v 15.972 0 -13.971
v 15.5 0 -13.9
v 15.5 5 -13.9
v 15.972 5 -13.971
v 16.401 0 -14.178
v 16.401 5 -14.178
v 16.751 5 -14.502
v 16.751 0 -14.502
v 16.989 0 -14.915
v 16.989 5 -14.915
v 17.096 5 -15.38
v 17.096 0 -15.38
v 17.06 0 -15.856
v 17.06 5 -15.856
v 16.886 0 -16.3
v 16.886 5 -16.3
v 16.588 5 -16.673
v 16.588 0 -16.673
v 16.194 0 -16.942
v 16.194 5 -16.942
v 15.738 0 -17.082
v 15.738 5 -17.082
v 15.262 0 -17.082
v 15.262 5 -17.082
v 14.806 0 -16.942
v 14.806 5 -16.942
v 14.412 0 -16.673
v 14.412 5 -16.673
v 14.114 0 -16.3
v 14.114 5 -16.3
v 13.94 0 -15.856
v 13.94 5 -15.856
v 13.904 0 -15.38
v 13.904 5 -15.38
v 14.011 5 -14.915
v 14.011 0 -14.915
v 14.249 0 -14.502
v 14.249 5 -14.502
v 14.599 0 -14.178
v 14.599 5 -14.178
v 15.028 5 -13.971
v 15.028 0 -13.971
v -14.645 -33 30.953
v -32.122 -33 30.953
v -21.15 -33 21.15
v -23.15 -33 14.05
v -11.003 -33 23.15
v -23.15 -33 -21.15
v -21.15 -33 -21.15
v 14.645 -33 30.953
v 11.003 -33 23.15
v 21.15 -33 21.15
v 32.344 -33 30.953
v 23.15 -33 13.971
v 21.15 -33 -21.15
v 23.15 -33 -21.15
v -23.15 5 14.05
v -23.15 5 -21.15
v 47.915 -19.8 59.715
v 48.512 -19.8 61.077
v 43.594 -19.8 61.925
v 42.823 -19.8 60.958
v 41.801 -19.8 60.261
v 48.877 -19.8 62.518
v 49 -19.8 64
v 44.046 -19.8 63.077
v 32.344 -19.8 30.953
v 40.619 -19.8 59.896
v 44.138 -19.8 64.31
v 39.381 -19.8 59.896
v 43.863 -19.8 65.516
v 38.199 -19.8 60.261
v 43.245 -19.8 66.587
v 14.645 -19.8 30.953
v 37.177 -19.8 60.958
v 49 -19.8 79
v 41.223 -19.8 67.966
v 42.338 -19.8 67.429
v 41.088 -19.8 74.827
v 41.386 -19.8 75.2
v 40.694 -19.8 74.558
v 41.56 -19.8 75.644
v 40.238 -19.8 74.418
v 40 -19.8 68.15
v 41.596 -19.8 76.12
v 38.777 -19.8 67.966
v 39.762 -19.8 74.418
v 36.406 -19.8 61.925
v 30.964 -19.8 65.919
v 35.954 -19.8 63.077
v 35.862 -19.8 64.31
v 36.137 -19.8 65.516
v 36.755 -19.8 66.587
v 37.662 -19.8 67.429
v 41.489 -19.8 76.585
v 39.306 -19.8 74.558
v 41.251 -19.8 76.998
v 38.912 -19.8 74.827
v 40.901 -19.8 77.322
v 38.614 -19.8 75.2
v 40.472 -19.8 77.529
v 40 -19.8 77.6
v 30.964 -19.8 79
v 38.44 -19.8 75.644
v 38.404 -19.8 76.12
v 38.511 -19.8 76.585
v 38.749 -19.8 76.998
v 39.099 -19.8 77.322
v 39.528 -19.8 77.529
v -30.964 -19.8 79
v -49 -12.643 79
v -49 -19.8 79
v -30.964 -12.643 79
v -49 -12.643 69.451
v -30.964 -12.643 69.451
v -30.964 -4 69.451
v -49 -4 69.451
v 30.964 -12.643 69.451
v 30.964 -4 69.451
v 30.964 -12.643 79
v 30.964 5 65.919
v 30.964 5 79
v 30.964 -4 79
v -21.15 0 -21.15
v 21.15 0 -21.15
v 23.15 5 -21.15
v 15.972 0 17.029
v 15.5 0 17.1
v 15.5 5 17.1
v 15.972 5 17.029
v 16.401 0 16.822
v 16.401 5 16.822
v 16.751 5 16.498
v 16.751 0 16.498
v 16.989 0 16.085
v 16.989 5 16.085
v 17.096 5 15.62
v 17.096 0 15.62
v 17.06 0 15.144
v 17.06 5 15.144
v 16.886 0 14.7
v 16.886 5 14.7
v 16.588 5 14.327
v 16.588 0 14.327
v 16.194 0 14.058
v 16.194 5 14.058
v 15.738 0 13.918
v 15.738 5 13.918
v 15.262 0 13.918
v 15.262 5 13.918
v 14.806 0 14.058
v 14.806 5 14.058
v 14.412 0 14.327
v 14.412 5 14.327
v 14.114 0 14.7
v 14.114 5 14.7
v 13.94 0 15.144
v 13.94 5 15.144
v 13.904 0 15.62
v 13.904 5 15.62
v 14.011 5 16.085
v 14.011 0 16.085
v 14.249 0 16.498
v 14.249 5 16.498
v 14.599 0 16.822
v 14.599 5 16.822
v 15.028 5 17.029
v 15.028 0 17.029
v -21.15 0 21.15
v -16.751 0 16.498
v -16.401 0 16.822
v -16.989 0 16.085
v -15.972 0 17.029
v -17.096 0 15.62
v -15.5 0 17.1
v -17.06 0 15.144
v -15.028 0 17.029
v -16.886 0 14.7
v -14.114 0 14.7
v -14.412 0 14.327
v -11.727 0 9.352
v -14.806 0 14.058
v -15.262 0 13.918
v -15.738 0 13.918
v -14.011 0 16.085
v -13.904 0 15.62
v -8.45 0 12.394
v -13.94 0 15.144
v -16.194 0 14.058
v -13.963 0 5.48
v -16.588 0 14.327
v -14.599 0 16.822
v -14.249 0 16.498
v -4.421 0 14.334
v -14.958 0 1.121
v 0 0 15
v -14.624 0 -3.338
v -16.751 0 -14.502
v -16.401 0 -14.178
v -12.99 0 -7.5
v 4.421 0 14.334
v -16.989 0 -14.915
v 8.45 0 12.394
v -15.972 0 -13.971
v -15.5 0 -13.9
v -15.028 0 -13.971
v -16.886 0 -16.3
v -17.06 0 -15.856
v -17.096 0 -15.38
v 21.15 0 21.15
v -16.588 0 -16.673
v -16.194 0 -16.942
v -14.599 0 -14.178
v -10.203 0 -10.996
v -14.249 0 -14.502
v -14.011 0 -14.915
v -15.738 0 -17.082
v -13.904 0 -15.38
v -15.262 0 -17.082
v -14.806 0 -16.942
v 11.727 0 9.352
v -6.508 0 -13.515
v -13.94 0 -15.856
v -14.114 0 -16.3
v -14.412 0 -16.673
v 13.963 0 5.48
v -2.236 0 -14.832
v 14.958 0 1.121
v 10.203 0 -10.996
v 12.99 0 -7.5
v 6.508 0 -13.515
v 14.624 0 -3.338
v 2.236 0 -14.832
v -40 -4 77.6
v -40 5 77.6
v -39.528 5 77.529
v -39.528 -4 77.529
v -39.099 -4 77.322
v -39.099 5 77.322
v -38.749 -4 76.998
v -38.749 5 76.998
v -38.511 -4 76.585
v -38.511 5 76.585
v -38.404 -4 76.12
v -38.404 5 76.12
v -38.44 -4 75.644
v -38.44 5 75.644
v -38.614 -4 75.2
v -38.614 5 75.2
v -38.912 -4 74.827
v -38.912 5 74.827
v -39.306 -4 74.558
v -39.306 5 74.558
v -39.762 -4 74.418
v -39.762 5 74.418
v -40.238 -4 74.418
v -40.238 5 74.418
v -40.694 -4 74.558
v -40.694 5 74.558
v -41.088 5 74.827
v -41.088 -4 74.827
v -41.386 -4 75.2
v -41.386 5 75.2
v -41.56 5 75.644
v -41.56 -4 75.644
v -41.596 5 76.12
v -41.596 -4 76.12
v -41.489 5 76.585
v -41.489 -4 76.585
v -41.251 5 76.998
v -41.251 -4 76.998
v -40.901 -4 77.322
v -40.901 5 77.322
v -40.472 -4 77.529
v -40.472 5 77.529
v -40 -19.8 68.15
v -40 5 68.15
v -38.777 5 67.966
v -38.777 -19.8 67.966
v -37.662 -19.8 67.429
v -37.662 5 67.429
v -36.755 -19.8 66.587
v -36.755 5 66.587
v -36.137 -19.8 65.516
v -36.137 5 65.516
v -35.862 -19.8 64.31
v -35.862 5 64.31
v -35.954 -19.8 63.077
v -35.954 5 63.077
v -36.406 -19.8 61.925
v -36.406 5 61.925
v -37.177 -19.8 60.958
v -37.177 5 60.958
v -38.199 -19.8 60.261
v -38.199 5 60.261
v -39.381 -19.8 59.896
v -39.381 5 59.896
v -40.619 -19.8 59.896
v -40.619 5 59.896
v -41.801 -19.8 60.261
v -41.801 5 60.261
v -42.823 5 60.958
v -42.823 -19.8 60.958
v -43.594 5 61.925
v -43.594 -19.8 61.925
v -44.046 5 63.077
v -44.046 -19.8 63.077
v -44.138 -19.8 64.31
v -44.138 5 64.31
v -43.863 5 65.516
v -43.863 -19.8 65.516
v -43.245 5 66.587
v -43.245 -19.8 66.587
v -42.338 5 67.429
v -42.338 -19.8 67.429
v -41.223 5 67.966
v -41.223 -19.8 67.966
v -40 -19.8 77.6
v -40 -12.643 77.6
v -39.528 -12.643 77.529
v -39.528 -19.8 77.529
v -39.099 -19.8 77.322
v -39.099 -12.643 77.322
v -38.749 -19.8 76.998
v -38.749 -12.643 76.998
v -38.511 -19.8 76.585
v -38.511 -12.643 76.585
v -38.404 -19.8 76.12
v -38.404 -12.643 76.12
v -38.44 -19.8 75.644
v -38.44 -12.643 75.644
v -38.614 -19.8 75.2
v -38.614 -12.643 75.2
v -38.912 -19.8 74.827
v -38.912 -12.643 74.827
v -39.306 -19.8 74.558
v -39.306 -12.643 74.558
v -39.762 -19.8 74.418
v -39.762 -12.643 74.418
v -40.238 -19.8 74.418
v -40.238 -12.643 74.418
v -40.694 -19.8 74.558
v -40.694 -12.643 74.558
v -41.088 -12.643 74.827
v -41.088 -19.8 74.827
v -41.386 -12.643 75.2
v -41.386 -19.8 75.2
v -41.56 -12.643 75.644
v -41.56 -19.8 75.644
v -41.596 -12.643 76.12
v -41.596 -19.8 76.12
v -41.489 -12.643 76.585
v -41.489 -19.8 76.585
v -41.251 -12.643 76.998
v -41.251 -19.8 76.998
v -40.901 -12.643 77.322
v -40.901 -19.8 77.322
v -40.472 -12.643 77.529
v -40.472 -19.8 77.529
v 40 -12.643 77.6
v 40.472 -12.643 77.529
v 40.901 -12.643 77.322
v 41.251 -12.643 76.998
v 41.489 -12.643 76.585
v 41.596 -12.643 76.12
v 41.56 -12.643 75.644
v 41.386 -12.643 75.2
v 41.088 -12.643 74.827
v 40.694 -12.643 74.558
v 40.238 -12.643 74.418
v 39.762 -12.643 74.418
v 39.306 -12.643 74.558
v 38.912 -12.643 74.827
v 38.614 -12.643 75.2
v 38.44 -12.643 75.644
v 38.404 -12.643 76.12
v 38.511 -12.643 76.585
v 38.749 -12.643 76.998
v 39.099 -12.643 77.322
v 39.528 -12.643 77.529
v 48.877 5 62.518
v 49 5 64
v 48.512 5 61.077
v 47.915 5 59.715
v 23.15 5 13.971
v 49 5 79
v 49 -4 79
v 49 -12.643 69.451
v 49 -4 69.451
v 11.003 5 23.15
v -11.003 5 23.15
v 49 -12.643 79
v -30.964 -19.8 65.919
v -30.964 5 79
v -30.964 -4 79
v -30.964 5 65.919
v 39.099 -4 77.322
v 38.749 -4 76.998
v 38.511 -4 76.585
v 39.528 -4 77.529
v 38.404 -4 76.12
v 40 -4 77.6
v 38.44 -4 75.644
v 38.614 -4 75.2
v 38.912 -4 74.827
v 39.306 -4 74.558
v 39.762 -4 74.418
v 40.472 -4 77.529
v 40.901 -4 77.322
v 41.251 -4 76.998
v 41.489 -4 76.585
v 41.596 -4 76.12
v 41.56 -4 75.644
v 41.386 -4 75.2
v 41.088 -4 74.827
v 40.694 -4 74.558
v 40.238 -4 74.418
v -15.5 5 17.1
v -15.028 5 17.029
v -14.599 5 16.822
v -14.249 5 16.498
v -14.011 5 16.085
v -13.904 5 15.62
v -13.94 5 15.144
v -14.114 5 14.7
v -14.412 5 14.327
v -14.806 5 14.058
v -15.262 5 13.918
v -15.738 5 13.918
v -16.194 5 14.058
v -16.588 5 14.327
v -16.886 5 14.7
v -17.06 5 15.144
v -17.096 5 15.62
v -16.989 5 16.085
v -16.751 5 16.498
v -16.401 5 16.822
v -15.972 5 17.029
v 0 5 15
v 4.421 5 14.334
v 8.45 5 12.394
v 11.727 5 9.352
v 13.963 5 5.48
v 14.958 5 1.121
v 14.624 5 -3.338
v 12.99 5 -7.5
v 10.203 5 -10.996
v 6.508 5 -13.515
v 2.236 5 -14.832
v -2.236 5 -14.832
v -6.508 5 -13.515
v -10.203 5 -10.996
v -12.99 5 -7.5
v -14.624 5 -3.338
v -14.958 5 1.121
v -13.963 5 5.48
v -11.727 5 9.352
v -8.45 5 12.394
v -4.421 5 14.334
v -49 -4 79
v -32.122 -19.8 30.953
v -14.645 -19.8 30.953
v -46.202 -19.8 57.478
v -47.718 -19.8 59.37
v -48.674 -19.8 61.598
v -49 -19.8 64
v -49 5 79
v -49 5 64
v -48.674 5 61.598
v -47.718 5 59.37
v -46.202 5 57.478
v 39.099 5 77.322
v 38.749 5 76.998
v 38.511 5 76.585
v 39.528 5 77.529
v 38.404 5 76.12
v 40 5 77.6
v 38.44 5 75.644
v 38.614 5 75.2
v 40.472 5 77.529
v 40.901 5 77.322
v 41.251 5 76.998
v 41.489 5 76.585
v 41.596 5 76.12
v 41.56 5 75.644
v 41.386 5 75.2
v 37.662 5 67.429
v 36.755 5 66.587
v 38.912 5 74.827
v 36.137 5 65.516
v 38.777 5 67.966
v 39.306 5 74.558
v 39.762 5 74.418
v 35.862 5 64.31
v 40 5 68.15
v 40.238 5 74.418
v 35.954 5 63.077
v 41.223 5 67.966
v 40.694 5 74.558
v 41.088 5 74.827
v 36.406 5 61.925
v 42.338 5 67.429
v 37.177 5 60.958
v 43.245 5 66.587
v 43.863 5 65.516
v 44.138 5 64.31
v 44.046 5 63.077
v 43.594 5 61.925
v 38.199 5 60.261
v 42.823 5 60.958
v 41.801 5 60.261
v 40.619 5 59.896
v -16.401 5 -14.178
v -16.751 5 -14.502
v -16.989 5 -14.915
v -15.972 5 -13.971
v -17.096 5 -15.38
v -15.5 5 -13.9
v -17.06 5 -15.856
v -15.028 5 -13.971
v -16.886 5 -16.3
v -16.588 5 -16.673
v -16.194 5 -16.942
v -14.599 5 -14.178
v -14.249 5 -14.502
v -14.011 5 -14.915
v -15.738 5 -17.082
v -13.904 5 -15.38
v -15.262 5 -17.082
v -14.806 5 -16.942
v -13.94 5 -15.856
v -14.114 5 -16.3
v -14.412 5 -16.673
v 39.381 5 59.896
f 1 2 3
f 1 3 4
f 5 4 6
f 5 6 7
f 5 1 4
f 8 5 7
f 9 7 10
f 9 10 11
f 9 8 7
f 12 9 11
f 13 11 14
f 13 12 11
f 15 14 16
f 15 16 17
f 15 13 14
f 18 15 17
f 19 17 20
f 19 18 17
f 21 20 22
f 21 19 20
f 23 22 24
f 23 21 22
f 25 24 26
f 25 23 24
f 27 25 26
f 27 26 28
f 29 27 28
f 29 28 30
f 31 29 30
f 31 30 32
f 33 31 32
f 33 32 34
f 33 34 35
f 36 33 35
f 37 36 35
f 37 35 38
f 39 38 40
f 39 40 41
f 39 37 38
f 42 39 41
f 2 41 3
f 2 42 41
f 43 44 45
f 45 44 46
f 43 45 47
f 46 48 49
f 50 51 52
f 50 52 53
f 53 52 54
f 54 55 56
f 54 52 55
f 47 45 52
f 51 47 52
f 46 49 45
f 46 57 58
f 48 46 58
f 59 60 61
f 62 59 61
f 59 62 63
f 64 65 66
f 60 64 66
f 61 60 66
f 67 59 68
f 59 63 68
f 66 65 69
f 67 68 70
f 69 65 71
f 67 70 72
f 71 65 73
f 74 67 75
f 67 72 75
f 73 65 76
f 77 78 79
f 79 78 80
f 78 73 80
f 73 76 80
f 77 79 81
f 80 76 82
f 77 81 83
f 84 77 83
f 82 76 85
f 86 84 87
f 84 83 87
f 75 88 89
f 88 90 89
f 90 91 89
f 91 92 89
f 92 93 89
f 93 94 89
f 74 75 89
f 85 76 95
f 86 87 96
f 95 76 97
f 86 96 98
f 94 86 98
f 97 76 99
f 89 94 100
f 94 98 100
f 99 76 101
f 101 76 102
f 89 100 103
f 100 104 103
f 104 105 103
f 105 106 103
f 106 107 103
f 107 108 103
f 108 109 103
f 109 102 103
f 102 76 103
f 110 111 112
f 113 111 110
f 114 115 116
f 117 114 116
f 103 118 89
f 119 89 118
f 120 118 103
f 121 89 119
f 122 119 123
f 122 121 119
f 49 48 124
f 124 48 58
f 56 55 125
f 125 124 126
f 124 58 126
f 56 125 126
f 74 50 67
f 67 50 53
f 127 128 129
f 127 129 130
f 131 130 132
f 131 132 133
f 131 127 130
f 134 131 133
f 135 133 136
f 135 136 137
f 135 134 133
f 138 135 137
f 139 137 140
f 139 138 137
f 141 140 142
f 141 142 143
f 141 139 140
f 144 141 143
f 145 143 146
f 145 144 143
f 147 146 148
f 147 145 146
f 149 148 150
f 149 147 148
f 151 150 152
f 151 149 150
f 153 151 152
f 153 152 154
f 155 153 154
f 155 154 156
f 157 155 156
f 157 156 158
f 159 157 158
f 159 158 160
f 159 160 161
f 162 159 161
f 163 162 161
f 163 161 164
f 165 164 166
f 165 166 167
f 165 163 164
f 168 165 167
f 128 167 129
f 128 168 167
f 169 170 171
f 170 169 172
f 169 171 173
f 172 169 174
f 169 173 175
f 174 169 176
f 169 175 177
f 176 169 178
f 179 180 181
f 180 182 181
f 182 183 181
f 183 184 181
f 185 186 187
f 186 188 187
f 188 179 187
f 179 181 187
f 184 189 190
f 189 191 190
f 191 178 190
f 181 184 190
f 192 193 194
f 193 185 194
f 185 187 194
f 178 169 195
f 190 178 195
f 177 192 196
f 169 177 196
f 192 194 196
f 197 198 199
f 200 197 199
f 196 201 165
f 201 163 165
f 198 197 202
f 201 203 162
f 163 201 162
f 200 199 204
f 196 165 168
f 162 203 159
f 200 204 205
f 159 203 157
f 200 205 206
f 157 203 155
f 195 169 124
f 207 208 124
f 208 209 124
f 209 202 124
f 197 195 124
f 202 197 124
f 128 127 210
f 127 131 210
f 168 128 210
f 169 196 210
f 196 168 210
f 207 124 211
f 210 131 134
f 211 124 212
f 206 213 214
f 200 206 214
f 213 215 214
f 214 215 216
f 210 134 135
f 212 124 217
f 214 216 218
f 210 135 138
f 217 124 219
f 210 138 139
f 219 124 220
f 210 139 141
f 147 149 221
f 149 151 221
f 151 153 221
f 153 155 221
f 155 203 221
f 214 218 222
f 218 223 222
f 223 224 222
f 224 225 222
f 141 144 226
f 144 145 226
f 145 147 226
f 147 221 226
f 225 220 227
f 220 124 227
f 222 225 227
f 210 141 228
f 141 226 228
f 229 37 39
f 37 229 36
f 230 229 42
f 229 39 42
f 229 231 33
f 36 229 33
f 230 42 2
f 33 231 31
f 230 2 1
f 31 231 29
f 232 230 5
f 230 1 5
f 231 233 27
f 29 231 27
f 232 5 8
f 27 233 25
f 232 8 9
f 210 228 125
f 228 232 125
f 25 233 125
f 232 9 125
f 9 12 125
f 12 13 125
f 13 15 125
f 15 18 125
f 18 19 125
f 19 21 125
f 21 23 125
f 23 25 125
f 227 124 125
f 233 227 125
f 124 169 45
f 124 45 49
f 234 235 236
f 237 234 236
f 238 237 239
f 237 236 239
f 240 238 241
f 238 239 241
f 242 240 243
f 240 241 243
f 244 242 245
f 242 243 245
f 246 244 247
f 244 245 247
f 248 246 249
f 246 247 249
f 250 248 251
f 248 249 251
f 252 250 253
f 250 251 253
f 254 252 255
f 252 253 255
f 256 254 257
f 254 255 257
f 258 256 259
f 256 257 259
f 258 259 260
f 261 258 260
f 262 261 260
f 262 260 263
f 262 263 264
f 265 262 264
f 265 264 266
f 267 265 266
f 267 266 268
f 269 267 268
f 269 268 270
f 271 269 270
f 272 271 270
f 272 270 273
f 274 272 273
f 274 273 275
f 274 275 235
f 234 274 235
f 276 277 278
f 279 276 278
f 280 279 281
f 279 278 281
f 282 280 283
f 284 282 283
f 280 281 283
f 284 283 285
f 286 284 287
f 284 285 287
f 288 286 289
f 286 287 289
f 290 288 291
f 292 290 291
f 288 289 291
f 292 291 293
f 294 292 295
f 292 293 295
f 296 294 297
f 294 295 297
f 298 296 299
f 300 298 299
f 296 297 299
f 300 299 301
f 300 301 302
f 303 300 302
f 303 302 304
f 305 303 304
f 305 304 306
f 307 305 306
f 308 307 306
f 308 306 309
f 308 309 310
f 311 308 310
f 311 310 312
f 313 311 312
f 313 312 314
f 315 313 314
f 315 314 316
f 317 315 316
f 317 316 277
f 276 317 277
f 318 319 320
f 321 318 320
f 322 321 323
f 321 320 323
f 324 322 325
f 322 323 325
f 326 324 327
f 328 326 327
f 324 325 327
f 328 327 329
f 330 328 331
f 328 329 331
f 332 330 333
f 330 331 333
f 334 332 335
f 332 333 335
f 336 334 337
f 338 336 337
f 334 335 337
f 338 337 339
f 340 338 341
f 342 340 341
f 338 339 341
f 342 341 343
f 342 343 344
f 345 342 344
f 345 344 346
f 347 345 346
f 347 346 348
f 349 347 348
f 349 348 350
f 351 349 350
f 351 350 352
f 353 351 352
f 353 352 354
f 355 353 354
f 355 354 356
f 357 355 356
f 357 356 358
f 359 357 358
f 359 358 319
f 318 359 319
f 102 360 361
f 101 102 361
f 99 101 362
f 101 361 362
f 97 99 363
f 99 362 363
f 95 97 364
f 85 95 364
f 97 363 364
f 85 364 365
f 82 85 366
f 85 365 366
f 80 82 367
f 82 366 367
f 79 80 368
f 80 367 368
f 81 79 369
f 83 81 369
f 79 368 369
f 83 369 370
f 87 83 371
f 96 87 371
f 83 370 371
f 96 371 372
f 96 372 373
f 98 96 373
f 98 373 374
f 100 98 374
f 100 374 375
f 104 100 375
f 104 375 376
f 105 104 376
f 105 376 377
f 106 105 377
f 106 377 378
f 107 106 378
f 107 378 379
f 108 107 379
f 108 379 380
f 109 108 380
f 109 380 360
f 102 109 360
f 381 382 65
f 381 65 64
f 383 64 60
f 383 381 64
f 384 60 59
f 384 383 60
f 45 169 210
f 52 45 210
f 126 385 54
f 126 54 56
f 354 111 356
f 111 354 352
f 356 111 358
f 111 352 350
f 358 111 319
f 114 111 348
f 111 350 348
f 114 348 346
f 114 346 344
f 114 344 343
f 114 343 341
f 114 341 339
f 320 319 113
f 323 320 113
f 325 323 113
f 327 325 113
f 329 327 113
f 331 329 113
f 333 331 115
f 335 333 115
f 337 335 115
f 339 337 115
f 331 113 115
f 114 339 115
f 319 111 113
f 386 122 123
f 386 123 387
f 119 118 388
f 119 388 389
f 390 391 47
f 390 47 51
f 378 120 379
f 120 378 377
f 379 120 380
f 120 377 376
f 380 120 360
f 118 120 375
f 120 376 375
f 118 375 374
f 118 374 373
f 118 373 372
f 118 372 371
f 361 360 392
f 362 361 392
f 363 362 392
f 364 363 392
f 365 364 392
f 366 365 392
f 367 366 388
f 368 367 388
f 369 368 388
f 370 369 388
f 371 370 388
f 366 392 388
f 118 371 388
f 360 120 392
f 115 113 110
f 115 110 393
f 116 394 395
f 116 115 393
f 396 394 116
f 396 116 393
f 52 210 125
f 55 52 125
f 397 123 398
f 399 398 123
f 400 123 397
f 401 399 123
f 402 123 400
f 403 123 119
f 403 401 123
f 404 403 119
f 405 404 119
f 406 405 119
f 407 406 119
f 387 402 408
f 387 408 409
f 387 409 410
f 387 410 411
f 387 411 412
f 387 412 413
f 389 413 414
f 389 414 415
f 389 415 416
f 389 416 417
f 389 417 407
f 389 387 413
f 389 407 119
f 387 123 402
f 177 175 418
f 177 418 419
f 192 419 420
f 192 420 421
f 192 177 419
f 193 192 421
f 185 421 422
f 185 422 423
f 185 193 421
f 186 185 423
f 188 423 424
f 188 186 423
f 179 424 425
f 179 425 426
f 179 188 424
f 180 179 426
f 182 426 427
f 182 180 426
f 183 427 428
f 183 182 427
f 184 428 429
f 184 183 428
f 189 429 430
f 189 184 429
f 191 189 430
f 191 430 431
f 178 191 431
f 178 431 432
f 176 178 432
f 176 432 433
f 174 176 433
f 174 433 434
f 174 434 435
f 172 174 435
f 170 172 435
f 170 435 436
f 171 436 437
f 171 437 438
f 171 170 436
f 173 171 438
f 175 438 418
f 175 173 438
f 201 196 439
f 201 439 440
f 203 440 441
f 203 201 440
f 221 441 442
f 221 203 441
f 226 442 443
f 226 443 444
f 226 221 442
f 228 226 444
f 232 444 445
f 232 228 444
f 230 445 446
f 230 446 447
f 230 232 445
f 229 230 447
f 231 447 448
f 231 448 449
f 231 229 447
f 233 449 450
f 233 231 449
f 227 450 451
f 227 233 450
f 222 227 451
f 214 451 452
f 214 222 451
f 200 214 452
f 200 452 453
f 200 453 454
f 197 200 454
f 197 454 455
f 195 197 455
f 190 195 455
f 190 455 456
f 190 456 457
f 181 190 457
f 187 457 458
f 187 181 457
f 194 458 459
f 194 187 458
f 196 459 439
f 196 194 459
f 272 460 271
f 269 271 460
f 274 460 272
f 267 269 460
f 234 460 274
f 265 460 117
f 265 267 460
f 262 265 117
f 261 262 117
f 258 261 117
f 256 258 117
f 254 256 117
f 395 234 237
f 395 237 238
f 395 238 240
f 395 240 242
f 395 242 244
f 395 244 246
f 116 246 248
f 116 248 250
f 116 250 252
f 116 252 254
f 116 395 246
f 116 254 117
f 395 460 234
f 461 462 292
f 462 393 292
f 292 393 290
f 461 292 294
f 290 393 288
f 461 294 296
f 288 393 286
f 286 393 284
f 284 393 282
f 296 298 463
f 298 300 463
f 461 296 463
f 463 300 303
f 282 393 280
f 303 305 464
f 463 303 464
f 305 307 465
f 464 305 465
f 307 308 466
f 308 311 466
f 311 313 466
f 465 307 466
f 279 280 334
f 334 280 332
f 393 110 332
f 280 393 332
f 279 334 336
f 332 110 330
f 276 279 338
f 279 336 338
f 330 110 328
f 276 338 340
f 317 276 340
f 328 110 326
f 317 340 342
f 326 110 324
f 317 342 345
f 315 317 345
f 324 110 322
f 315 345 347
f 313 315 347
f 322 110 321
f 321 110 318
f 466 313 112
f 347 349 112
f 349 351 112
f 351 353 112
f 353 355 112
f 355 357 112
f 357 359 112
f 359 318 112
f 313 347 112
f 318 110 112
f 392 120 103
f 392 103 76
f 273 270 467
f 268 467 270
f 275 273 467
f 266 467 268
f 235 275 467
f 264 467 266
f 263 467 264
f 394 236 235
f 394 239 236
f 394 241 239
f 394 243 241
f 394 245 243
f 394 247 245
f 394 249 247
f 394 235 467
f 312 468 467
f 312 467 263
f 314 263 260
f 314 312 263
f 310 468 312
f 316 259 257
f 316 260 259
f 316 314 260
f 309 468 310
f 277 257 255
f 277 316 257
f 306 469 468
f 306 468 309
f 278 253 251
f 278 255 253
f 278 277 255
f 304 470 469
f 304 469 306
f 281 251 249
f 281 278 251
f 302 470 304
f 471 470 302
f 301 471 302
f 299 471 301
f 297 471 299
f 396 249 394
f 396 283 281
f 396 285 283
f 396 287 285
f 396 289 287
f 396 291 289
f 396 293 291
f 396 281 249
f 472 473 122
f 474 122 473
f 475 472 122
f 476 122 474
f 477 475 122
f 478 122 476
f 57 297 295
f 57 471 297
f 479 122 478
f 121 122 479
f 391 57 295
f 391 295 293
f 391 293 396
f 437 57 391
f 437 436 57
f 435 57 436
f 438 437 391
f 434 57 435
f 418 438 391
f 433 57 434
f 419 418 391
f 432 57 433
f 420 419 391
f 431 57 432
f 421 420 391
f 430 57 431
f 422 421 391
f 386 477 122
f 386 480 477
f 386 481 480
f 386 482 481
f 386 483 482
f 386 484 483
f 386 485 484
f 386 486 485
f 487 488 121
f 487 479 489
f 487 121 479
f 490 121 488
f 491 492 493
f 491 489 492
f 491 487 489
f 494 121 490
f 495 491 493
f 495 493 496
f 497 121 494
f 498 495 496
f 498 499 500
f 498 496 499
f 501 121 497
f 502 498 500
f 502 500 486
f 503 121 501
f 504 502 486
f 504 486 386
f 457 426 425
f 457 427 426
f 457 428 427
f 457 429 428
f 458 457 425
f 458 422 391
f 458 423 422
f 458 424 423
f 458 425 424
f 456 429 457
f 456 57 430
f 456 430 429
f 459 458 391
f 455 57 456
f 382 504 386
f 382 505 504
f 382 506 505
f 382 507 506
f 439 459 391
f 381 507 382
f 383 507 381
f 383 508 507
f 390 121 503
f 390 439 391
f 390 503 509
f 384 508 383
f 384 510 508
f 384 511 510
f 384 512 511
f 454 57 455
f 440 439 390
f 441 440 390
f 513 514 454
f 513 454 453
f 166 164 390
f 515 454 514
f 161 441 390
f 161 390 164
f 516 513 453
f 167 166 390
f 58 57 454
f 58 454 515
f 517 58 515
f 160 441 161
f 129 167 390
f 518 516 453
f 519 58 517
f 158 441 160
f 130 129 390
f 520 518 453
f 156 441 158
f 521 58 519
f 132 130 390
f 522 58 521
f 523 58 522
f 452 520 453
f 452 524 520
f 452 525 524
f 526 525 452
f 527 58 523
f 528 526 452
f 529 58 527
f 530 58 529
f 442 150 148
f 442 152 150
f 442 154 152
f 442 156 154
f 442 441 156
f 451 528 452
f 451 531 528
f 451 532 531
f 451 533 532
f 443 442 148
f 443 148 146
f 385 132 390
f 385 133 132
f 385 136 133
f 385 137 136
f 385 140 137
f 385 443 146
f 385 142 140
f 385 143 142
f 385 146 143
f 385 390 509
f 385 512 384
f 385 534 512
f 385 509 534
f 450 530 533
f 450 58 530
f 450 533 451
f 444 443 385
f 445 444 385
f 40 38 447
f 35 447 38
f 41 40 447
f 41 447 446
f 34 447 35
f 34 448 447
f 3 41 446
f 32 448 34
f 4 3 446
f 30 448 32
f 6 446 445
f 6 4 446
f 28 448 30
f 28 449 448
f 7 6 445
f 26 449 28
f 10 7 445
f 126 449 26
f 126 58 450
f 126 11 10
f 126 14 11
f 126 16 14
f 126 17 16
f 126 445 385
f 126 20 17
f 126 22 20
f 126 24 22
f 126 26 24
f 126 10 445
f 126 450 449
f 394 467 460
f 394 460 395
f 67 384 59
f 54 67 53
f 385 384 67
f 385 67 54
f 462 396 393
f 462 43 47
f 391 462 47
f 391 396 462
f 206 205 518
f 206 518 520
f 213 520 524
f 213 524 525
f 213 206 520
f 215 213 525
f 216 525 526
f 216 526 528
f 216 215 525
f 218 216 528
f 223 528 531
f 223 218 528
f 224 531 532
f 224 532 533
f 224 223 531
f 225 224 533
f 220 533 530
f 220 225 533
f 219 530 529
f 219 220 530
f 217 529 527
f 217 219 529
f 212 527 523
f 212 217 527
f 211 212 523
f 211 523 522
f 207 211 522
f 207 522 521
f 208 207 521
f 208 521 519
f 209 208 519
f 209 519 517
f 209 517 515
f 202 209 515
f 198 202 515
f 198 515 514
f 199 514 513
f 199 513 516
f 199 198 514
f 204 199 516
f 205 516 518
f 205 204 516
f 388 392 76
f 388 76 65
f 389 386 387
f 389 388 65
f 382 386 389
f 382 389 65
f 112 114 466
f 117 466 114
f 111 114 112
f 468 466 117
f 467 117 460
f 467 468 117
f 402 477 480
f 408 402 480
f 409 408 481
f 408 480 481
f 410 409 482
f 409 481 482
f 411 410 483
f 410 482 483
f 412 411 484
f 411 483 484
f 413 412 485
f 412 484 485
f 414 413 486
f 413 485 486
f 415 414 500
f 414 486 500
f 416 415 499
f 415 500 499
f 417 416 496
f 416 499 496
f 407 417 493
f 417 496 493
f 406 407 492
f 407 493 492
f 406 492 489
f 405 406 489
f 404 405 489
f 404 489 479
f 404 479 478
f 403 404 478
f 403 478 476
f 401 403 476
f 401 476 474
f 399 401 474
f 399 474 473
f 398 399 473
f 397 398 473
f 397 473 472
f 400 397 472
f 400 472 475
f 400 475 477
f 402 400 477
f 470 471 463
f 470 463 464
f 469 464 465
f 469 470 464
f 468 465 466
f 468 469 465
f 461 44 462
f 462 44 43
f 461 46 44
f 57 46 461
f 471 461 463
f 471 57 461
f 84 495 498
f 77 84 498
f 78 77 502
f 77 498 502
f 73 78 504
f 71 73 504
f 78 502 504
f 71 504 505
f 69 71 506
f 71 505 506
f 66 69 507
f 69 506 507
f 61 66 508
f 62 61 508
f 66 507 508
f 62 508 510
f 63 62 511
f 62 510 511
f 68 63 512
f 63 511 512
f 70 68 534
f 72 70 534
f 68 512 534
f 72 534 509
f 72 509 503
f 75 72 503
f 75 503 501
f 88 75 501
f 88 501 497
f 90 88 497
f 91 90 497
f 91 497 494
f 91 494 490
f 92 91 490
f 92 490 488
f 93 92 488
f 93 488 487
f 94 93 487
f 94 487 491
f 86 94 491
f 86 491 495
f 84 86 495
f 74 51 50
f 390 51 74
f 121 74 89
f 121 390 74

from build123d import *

# Parameters (mm, degrees)
SKETCH_6_W          = 42.3
SKETCH_6_H          = 42.3
SKETCH_6_R          = 1.6
SKETCH_6_R_2        = 15
EXTRUDE_1_DEPTH     = 5
SKETCH_7_R          = 1.6
SKETCH_7_R_2        = 4.15
EXTRUDE_5_DEPTH     = 38
SKETCH_7_7_R        = 4.15
SKETCH_7_7_R_2      = 1.6
EXTRUDE_7_DEPTH     = 38
SKETCH_7_8_R        = 4.15
SKETCH_7_8_R_2      = 1.6
EXTRUDE_8_DEPTH     = 38
SKETCH_12_W         = 2
SKETCH_12_H         = 44.3
EXTRUDE_11_DEPTH    = 38
SKETCH_14_W         = 44.3
SKETCH_14_H         = 2
EXTRUDE_12_DEPTH    = 38
SKETCH_15_W         = 2
SKETCH_15_H         = 42.3
EXTRUDE_13_DEPTH    = 38
CUT_EXTRUDE_1_DEPTH = 13.2
SKETCH_18_W         = 9.549489015
SKETCH_18_H         = 8.643215043
CUT_EXTRUDE_2_DEPTH = 123


with BuildPart() as part:
    # 草图6 → 凸台-拉伸1 (new body)
    with BuildSketch(Plane(origin=(0, 0, 0), x_dir=(1, 0, 0), z_dir=(0, 1, 0))):
        Rectangle(SKETCH_6_W, SKETCH_6_H)
        with Locations(Location((15.5, 15.5, 0), (0, 0, 270))):
            Circle(SKETCH_6_R, mode=Mode.SUBTRACT)
        with Locations(Location((-15.5, 15.5, 0), (0, 0, 270))):
            Circle(SKETCH_6_R, mode=Mode.SUBTRACT)
        with Locations(Location((-15.5, -15.5, 0), (0, 0, 270))):
            Circle(SKETCH_6_R, mode=Mode.SUBTRACT)
        with Locations(Location((15.5, -15.5, 0), (0, 0, 270))):
            Circle(SKETCH_6_R, mode=Mode.SUBTRACT)
        with Locations(Location((0, 0, 0), (0, 0, 270))):
            Circle(SKETCH_6_R_2, mode=Mode.SUBTRACT)
    extrude(amount=EXTRUDE_1_DEPTH)

    # 草图7 → 凸台-拉伸5 (add)
    with BuildSketch(Plane(origin=(0, 5, 0), x_dir=(1, 0, 0), z_dir=(0, 1, 0))):
        with BuildLine():
            Line((49, -79), (49, -64))
            ThreePointArc((49, -64), (48.724429591, -61.789948347), (47.914593709, -59.715235547))
            Line((47.914593709, -59.715235547), (21.15, -10.277072187))
            Line((21.15, -10.277072187), (21.15, -21.15))
            Line((21.15, -21.15), (10.070005019, -21.15))
            Line((10.070005019, -21.15), (30.963898233, -65.919418373))
            Line((30.963898233, -65.919418373), (30.963898233, -79))
            Line((30.963898233, -79), (49, -79))
        make_face()
        with Locations(Location((40, -76, 0), (0, 0, 270))):
            Circle(SKETCH_7_R, mode=Mode.SUBTRACT)
        with Locations(Location((40, -64, 0), (0, 0, 270))):
            Circle(SKETCH_7_R_2, mode=Mode.SUBTRACT)
        with BuildLine():
            Line((-30.963898233, -65.919418373), (-10.070005019, -21.15))
            Line((-10.070005019, -21.15), (-21.15, -21.15))
            Line((-21.15, -21.15), (-21.15, -10.282583808))
            Line((-21.15, -10.282583808), (-46.202269248, -57.478354795))
            ThreePointArc((-46.202269248, -57.478354795), (-48.271046585, -60.45179082), (-49, -64))
            Line((-49, -64), (-49, -79))
            Line((-49, -79), (-30.963898233, -79))
            Line((-30.963898233, -79), (-30.963898233, -65.919418373))
        make_face()
        with Locations(Location((-40, -76, 0), (0, 0, 270))):
            Circle(SKETCH_7_R, mode=Mode.SUBTRACT)
        with Locations(Location((-40, -64, 0), (0, 0, 270))):
            Circle(SKETCH_7_R_2, mode=Mode.SUBTRACT)
    extrude(amount=-EXTRUDE_5_DEPTH)


with BuildPart() as extrude_7_tool:
    # 草图7<7> → 凸台-拉伸7 (new body)
    with BuildSketch(Plane(origin=(0, 5, 0), x_dir=(1, 0, 0), z_dir=(0, 1, 0))):
        with Locations(Location((-40, -64, 0), (0, 0, 270))):
            Circle(SKETCH_7_7_R)
        with Locations(Location((40, -64, 0), (0, 0, 270))):
            Circle(SKETCH_7_7_R)
        with Locations(Location((40, -76, 0), (0, 0, 270))):
            Circle(SKETCH_7_7_R_2)
        with Locations(Location((-40, -76, 0), (0, 0, 270))):
            Circle(SKETCH_7_7_R_2)
    extrude(amount=EXTRUDE_7_DEPTH)


with BuildPart() as part_1:
    add(part.part)


with BuildPart() as part_2:
    # 凸台-拉伸7: joined with extrude_7_tool
    add(part_1.part.fuse(extrude_7_tool.part, tol=0.00001))


with BuildPart() as extrude_7_kept_piece:
    # of the separate pieces the step leaves, the one the design keeps (extrude_7_pieces_kept)
    add(part_2.part.solids().sort_by_distance((-10.070005019, 0, 21.15))[0])


with BuildPart() as extrude_8_tool:
    # 草图7<8> → 凸台-拉伸8 (new body)
    with BuildSketch(Plane(origin=(0, 5, 0), x_dir=(1, 0, 0), z_dir=(0, 1, 0))):
        with Locations(Location((-40, -64, 0), (0, 0, 270))):
            Circle(SKETCH_7_8_R)
        with Locations(Location((40, -64, 0), (0, 0, 270))):
            Circle(SKETCH_7_8_R)
        with Locations(Location((40, -76, 0), (0, 0, 270))):
            Circle(SKETCH_7_8_R_2)
        with Locations(Location((-40, -76, 0), (0, 0, 270))):
            Circle(SKETCH_7_8_R_2)
    extrude(amount=EXTRUDE_8_DEPTH)


with BuildPart() as extrude_7_kept_piece_1:
    add(extrude_7_kept_piece.part)


with BuildPart() as extrude_7_kept_piece_2:
    # 凸台-拉伸8: joined with extrude_8_tool
    add(extrude_7_kept_piece_1.part.fuse(extrude_8_tool.part, tol=0.00001))


with BuildPart() as extrude_8_kept_piece:
    # of the separate pieces the step leaves, the one the design keeps (extrude_8_pieces_kept)
    add(extrude_7_kept_piece_2.part.solids().sort_by_distance((-10.070005019, 0, 21.15))[0])

    # 草图12 → 凸台-拉伸11 (add)
    with BuildSketch(Plane(origin=(0, 5, 0), x_dir=(1, 0, 0), z_dir=(0, 1, 0))):
        with Locations((22.15, -1)):
            Rectangle(SKETCH_12_W, SKETCH_12_H)
    extrude(amount=-EXTRUDE_11_DEPTH)

    # 草图14 → 凸台-拉伸12 (add)
    with BuildSketch(Plane(origin=(0, 5, 0), x_dir=(1, 0, 0), z_dir=(0, 1, 0))):
        with Locations((-1, -22.15)):
            Rectangle(SKETCH_14_W, SKETCH_14_H)
    extrude(amount=-EXTRUDE_12_DEPTH)

    # 草图15 → 凸台-拉伸13 (add)
    with BuildSketch(Plane(origin=(0, 5, 0), x_dir=(1, 0, 0), z_dir=(0, 1, 0))):
        with Locations((-22.15, 0)):
            Rectangle(SKETCH_15_W, SKETCH_15_H)
    extrude(amount=-EXTRUDE_13_DEPTH)

    # 草图17 → 切除-拉伸1 (cut)
    with BuildSketch(Plane.XZ.offset(33)):
        Polygon((62.040525686, 30.953335803), (-8.604799232, 30.953335803), (-61.83718559, 30.953335803), (-61.83718559, 85.06296978), (-8.604799232, 85.06296978), (62.040525686, 85.06296978), align=None)
    extrude(amount=-CUT_EXTRUDE_1_DEPTH, mode=Mode.SUBTRACT)

    # 草图18 → 切除-拉伸2 (cut)
    with BuildSketch(Plane(origin=(49, 0, 0), x_dir=(0, 0, -1), z_dir=(1, 0, 0))):
        with Locations((-74.225255492, -8.321607522)):
            Rectangle(SKETCH_18_W, SKETCH_18_H)
    extrude(amount=-CUT_EXTRUDE_2_DEPTH, mode=Mode.SUBTRACT)


solid = extrude_8_kept_piece.part
